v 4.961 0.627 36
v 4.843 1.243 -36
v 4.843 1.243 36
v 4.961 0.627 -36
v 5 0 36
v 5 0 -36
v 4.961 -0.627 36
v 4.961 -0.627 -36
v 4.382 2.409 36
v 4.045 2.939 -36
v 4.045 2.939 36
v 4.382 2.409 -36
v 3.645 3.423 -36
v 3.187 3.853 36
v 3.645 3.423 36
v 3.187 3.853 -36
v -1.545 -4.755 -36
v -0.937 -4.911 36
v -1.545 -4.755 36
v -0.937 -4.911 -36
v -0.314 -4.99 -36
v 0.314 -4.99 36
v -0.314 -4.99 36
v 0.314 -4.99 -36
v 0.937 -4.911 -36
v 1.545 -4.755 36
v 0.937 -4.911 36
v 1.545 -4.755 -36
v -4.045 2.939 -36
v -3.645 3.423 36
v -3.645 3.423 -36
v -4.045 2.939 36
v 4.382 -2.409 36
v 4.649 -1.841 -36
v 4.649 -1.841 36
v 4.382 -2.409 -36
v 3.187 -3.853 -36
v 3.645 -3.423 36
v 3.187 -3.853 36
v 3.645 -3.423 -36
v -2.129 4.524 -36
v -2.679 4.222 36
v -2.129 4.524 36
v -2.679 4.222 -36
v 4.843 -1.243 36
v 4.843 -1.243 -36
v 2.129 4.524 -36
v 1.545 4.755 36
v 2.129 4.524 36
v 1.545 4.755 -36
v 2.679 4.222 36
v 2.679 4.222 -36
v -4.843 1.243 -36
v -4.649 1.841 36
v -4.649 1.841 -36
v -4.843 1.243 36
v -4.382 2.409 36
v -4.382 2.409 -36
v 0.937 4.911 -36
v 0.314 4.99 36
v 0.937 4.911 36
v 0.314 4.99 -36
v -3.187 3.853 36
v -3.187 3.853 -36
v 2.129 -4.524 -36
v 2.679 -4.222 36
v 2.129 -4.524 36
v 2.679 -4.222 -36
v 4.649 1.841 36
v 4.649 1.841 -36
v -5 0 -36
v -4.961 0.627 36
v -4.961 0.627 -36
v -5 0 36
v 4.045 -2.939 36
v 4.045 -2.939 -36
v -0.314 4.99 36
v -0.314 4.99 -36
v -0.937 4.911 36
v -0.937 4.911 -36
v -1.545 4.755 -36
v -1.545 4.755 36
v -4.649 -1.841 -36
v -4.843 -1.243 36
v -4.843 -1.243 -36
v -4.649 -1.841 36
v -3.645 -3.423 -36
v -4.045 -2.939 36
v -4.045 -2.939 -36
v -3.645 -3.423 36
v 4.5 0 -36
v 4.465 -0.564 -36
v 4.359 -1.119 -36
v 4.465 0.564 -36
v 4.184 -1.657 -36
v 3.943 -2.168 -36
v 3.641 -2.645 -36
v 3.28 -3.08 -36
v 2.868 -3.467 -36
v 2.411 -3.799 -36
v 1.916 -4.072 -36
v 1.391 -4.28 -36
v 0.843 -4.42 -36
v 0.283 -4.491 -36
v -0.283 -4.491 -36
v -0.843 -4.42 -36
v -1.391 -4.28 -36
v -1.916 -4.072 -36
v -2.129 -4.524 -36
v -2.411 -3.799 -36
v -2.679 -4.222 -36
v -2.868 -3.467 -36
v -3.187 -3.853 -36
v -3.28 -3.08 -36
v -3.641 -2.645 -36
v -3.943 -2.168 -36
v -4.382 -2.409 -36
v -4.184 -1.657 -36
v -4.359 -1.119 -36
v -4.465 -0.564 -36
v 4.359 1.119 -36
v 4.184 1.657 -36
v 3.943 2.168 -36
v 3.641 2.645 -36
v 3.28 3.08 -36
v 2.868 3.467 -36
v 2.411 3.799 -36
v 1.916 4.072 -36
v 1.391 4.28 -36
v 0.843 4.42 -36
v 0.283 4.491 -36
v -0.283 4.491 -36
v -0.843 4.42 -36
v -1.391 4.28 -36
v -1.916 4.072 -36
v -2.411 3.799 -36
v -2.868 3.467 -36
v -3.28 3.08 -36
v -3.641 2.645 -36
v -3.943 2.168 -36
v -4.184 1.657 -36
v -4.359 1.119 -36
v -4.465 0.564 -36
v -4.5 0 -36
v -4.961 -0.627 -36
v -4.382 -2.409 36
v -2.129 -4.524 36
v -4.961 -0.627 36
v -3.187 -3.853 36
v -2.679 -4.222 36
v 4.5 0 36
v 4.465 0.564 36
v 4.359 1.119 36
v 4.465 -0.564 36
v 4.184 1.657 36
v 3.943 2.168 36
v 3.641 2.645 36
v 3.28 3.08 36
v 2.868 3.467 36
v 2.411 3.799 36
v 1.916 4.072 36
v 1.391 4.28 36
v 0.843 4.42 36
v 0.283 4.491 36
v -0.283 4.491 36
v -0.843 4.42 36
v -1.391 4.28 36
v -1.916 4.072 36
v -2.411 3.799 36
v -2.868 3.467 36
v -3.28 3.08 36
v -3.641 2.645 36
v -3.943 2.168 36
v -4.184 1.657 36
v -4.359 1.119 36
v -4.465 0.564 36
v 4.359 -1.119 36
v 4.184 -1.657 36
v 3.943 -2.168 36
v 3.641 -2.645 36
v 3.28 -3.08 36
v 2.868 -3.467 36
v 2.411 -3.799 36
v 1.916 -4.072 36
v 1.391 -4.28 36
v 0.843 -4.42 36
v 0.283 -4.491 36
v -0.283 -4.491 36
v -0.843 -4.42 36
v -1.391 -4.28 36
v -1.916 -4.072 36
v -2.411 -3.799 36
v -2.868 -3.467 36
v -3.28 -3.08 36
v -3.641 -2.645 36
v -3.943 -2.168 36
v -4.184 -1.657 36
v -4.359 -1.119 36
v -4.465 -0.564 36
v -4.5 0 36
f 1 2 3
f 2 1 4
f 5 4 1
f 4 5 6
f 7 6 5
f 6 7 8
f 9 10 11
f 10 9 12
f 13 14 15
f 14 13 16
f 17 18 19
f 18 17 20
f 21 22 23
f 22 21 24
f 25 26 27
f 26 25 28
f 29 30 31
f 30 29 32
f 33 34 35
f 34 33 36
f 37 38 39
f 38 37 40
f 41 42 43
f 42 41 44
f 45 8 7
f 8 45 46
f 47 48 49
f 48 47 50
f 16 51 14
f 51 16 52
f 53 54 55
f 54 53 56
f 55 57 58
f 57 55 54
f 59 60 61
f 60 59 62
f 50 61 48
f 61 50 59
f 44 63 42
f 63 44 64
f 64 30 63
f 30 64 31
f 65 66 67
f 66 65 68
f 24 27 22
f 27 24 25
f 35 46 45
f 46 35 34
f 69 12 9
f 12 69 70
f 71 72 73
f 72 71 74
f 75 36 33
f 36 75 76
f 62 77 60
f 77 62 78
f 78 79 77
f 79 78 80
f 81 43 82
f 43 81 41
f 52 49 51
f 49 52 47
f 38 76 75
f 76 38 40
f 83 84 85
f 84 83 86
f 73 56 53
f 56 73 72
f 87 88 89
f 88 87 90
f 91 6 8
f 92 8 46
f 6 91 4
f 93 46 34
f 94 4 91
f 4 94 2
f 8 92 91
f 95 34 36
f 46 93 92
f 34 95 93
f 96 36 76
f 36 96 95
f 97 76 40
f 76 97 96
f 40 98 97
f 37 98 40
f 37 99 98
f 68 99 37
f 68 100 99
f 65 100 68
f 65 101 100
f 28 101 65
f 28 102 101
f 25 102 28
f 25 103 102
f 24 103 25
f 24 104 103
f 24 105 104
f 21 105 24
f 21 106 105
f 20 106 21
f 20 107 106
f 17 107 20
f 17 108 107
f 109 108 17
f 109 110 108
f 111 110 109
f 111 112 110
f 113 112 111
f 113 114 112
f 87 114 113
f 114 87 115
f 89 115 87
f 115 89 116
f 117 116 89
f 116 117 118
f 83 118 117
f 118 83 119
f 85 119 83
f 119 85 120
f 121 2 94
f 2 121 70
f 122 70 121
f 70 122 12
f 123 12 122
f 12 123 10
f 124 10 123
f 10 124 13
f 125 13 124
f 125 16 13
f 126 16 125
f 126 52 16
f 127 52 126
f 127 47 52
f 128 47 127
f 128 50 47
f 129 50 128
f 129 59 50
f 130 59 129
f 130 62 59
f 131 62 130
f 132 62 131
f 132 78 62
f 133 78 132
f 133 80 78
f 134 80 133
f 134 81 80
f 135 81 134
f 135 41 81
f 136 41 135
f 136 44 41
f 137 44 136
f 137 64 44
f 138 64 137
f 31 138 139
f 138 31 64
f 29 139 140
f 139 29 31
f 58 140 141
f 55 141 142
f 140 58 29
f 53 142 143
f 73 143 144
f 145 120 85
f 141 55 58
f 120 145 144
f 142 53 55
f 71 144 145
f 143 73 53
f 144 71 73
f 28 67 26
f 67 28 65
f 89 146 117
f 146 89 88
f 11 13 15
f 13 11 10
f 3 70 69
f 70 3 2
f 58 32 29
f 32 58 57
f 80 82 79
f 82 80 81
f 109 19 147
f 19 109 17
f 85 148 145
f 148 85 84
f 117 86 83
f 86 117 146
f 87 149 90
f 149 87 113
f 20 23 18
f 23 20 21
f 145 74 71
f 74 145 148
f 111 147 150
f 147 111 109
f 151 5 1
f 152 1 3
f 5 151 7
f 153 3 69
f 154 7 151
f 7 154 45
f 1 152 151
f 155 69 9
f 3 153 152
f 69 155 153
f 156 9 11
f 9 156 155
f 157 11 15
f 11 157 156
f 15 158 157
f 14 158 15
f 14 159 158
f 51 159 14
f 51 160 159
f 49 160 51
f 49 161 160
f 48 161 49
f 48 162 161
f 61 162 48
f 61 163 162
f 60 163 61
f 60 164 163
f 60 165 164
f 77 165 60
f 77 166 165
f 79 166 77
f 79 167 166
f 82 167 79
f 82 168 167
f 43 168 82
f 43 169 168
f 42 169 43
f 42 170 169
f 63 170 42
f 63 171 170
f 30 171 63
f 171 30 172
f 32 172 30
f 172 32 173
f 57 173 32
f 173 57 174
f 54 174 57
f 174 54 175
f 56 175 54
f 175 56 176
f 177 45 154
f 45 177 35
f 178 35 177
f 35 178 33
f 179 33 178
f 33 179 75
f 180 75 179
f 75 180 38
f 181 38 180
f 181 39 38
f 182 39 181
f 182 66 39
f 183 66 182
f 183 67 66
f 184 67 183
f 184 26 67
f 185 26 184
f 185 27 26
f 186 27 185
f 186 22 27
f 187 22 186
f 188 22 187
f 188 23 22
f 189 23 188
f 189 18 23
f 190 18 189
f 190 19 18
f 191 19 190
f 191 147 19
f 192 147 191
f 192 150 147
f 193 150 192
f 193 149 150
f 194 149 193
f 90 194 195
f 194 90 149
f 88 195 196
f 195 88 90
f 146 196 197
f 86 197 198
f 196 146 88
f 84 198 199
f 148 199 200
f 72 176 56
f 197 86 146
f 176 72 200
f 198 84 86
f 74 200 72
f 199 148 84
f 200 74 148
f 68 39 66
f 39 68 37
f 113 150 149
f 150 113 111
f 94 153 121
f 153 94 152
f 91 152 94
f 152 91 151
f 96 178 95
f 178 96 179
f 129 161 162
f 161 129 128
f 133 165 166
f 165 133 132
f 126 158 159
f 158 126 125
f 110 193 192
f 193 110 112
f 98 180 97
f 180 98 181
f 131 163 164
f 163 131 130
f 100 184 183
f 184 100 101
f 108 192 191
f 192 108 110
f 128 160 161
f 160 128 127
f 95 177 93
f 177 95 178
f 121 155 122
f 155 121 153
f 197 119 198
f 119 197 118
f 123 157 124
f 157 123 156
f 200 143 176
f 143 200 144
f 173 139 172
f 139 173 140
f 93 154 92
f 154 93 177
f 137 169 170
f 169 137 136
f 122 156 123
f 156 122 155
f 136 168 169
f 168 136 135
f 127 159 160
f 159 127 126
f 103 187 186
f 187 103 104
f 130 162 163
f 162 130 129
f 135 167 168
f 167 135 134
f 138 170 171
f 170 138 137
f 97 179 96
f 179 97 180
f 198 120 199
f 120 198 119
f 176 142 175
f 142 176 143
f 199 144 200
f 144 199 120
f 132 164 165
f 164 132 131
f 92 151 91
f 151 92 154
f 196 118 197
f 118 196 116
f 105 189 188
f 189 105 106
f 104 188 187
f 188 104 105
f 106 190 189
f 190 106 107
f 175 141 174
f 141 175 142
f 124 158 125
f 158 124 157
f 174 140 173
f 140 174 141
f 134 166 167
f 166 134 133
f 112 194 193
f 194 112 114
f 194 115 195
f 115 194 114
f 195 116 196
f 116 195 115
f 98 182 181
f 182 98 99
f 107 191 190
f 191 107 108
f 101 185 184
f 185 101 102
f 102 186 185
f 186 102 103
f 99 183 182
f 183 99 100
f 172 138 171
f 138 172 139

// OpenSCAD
$fn = 50;


difference() {
	union() {
		translate(v = [0, 0, -36.0000000000]) {
			cylinder(h = 72, r = 5.0000000000);
		}
	}
	union() {
		translate(v = [0, 0, -100.0000000000]) {
			cylinder(h = 200, r = 4.5000000000);
		}
	}
}
